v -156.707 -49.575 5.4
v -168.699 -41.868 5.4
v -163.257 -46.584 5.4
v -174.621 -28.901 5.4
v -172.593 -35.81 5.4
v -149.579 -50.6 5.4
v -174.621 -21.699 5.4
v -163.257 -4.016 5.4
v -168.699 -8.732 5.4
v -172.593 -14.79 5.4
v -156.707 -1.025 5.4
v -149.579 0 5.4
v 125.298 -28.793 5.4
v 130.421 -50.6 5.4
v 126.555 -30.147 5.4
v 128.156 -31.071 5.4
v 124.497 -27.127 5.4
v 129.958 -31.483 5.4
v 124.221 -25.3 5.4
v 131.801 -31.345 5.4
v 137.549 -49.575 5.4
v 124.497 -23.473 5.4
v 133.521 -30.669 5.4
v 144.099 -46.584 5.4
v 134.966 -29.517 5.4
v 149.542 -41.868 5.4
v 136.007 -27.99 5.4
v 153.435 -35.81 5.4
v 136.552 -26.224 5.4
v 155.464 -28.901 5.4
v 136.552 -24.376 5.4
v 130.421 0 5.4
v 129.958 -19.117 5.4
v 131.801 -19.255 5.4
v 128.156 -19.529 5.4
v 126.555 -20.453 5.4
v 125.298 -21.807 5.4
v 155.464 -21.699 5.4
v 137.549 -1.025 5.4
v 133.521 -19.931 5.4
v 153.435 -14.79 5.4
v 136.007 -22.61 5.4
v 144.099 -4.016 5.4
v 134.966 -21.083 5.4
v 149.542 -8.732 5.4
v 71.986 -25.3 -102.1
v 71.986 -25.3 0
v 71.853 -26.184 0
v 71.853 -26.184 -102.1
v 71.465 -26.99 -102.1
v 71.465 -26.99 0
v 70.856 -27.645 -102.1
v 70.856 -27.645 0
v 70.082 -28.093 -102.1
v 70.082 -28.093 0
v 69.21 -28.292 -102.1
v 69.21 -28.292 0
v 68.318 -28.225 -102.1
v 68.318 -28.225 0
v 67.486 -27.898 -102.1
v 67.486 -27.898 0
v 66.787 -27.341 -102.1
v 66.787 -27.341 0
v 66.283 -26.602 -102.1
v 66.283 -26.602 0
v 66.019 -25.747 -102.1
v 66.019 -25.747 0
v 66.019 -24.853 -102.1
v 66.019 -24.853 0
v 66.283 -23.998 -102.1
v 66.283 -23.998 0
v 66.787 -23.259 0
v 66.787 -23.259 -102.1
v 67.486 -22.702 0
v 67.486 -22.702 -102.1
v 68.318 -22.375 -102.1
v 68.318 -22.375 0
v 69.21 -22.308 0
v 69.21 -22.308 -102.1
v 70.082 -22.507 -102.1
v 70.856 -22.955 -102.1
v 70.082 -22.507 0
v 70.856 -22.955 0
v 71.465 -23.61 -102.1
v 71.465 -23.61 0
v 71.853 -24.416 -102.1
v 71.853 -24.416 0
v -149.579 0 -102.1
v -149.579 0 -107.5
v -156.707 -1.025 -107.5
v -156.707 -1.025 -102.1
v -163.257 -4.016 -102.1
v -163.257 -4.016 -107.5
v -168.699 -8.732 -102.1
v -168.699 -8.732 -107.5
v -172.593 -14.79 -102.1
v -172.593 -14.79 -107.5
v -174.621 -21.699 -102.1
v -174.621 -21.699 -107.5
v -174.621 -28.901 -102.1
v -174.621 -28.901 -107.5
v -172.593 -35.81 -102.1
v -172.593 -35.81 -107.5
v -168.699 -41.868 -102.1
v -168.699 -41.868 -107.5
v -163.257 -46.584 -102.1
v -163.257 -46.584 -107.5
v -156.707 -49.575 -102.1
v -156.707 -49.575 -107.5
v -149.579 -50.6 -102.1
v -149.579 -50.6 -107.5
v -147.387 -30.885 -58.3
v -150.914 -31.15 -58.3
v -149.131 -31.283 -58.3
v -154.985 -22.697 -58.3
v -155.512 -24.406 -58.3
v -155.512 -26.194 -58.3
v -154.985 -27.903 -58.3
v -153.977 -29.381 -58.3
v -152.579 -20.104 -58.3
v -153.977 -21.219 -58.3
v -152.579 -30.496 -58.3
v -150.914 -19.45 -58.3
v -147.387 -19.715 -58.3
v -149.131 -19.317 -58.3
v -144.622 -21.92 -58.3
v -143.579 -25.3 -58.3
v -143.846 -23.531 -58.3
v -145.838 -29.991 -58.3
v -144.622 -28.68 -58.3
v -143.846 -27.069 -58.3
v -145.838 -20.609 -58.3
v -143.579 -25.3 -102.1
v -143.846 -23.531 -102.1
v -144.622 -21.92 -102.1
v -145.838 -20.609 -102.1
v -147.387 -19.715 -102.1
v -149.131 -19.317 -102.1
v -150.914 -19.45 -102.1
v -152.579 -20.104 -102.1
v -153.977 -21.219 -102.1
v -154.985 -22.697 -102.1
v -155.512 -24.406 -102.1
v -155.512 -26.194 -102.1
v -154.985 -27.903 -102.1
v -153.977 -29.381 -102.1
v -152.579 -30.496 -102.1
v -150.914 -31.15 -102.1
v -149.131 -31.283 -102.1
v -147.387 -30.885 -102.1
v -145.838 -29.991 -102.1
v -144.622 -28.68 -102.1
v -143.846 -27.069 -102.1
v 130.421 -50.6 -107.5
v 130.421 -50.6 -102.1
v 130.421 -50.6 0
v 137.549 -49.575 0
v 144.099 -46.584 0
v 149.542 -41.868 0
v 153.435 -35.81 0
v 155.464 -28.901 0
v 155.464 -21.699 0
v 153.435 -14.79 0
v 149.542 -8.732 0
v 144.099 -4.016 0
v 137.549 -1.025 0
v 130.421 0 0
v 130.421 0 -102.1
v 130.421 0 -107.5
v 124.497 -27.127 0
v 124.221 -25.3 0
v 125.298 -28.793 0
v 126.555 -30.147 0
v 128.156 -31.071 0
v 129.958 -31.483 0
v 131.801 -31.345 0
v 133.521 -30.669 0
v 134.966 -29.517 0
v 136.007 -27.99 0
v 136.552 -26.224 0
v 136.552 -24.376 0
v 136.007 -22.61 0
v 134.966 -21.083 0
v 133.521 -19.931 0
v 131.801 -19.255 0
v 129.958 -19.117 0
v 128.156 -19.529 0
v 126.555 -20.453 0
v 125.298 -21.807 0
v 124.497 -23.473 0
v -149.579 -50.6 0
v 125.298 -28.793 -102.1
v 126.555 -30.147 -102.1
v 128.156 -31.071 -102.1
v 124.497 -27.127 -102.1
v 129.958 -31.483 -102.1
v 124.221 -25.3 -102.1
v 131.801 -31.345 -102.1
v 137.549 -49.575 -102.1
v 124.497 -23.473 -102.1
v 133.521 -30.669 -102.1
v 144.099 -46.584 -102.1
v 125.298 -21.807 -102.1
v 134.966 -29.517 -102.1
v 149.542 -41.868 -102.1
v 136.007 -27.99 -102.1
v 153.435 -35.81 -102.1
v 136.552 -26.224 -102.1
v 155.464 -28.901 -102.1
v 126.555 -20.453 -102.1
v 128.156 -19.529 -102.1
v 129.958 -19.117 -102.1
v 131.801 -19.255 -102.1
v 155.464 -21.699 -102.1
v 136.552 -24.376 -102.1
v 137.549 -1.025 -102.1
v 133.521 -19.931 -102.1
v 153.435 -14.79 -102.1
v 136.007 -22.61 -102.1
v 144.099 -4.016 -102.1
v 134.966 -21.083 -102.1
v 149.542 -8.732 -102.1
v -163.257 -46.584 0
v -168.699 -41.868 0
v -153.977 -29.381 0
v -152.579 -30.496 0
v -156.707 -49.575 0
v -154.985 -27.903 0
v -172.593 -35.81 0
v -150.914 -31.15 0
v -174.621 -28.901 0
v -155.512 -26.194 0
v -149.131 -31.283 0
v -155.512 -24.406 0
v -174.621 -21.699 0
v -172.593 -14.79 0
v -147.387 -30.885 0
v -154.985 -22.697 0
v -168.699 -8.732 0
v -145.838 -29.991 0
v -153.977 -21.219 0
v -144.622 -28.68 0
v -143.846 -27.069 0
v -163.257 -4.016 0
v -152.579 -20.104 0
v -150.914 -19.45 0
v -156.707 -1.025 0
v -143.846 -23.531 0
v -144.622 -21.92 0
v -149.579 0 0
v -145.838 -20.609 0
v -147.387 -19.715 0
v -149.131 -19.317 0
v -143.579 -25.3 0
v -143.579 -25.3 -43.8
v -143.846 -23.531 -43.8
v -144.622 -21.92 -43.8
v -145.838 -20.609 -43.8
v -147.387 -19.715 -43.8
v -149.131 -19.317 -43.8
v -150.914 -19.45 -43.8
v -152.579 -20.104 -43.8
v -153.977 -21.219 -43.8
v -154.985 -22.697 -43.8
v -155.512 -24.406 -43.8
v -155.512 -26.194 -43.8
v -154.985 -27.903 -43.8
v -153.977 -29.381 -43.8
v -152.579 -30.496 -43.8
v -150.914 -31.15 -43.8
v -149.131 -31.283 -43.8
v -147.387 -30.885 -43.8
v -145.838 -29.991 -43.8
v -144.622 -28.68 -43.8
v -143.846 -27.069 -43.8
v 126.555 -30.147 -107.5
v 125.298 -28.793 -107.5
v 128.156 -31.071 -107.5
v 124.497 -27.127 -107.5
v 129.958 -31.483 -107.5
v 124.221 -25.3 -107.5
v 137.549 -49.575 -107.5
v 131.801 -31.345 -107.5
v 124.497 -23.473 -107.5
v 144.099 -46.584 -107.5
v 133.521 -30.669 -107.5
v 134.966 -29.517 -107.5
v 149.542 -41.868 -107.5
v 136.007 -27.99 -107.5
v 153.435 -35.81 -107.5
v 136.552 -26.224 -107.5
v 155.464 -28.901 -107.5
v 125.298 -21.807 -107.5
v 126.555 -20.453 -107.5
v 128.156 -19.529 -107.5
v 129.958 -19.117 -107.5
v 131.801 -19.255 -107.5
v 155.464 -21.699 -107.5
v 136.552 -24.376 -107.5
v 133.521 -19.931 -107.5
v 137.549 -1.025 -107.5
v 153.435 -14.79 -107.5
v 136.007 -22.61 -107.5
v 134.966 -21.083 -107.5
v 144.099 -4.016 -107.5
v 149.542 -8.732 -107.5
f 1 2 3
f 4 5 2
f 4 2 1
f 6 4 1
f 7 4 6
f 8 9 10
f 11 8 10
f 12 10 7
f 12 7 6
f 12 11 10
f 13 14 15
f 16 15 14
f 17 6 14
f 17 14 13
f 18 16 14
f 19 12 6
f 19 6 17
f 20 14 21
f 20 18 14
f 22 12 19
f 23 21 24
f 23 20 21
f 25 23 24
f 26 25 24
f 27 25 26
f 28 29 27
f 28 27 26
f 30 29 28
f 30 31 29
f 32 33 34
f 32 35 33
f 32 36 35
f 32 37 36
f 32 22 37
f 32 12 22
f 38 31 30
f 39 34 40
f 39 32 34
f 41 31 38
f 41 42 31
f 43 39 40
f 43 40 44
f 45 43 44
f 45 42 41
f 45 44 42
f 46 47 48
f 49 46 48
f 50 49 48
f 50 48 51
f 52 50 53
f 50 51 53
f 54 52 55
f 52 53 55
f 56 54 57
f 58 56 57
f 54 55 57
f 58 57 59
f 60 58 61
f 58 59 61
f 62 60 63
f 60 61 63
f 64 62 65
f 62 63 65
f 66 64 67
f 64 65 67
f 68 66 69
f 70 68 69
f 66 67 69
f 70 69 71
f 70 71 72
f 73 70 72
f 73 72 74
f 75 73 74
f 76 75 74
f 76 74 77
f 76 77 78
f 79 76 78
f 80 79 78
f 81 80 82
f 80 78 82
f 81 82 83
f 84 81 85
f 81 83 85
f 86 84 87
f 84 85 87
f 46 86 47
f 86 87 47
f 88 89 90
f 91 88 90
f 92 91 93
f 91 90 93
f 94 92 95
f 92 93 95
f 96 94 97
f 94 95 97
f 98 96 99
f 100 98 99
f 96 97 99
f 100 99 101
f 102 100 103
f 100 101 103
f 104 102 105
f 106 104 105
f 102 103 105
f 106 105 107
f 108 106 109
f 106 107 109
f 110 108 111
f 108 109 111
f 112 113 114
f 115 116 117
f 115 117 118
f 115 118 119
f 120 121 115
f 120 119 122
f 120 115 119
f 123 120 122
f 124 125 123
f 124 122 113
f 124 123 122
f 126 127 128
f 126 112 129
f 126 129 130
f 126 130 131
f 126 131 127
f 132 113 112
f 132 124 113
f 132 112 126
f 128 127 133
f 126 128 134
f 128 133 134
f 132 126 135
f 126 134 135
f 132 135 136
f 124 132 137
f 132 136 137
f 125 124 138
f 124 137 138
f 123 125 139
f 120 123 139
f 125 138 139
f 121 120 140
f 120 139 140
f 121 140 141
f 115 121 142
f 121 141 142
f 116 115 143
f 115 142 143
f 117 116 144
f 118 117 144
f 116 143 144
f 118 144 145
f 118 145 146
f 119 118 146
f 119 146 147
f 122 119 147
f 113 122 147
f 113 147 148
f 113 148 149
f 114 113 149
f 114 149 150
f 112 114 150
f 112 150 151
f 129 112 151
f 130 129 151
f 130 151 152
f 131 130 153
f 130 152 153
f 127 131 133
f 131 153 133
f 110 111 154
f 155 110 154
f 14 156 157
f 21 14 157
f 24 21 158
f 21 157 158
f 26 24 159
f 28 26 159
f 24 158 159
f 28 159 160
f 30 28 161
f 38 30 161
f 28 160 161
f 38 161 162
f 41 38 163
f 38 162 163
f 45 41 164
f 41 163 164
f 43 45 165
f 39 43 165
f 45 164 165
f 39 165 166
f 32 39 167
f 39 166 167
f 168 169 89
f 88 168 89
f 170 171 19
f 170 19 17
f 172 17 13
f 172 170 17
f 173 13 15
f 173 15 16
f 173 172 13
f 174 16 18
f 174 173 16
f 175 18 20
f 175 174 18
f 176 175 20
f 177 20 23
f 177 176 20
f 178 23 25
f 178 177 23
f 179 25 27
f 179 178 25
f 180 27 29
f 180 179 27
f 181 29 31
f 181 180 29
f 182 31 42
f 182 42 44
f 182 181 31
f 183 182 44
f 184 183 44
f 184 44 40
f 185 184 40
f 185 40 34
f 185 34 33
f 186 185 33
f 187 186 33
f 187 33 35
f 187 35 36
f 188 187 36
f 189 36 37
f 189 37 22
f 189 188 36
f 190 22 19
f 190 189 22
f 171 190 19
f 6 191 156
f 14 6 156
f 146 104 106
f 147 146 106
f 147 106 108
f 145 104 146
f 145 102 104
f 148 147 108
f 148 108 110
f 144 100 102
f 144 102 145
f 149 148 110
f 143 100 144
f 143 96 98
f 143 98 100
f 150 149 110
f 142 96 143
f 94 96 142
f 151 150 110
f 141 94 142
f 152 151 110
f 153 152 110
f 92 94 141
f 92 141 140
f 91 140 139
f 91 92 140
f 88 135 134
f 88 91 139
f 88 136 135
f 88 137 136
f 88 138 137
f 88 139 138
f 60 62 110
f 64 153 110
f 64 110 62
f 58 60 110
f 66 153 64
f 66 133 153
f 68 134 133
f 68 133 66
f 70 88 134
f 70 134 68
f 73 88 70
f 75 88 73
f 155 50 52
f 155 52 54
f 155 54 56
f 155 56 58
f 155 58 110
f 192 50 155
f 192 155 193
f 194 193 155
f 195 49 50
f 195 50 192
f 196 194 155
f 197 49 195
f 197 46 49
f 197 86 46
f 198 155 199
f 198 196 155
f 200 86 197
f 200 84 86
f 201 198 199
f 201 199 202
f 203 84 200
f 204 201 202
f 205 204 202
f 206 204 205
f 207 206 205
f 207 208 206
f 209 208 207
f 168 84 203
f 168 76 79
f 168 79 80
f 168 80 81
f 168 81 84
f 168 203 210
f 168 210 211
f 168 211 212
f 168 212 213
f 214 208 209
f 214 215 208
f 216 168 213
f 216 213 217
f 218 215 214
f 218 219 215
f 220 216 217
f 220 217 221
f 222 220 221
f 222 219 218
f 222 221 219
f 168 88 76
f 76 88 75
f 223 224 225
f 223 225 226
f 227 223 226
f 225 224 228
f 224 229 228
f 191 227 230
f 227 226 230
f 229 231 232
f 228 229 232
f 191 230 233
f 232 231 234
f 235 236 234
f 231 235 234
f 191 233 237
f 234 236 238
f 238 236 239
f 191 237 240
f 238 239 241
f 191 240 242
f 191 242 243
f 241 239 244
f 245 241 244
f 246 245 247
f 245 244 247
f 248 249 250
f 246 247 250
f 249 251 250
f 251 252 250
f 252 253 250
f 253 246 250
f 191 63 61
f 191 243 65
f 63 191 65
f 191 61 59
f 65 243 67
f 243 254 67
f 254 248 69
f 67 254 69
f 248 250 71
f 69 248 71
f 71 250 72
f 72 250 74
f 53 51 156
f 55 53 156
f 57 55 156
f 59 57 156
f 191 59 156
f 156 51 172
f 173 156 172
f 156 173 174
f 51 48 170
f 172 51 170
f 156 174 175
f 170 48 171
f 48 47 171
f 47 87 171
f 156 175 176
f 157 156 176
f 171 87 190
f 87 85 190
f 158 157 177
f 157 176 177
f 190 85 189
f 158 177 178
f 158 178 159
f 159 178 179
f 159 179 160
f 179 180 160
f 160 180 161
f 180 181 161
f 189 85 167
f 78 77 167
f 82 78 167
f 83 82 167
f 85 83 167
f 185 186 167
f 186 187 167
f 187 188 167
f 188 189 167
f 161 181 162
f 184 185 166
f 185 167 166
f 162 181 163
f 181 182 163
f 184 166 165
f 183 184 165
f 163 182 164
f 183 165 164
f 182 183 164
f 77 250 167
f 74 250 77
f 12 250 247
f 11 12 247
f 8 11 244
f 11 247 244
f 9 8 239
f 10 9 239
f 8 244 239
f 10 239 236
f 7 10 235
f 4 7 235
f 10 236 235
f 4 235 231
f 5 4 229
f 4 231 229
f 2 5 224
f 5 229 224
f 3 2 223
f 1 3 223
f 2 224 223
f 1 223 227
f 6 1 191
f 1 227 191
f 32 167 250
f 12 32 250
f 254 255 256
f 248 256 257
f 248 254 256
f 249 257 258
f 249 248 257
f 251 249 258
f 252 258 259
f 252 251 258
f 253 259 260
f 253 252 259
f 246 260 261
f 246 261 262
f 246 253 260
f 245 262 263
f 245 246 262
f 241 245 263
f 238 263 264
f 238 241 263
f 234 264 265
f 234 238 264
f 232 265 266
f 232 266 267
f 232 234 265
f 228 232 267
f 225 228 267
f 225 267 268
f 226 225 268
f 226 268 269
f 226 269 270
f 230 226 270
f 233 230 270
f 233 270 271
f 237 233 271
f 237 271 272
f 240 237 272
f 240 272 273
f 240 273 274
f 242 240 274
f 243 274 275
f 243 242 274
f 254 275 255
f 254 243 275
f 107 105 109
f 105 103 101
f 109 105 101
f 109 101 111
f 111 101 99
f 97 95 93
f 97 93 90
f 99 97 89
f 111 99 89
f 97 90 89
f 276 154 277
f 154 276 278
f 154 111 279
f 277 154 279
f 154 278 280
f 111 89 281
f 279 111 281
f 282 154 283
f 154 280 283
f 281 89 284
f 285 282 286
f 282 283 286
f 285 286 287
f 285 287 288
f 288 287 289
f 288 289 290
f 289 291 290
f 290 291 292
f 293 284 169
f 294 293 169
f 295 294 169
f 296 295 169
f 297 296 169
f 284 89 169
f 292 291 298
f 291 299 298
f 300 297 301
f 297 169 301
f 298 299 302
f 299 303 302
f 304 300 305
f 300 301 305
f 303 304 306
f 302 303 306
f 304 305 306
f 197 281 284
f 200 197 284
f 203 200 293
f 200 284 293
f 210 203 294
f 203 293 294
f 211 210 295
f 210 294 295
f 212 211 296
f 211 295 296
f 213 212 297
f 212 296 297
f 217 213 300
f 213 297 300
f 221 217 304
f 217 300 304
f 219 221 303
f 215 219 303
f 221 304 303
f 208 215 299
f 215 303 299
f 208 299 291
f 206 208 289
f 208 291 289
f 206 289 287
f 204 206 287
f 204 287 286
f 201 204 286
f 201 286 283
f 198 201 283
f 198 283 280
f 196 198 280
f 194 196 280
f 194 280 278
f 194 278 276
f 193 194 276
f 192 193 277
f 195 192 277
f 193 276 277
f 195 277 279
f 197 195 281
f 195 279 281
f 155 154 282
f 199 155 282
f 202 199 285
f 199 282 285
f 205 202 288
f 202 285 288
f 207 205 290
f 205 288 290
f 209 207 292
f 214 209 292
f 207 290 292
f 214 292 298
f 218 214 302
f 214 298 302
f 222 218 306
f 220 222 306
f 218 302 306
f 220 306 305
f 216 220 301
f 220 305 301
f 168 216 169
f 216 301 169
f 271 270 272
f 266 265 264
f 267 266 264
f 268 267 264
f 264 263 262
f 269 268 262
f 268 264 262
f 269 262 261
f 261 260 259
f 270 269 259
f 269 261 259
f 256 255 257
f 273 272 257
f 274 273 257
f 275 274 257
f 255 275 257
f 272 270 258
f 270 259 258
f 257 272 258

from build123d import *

# Parameters (mm, degrees)
SKETCH1_R           = 6.2
BOSS_EXTRUDE1_DEPTH = 5.4
SKETCH2_R           = 3
BOSS_EXTRUDE3_DEPTH = 102.1
BOSS_EXTRUDE4_START = 5.4
SKETCH4_R           = 6.2
BOSS_EXTRUDE4_DEPTH = 5.4
SKETCH5_R           = 6
BOSS_EXTRUDE5_DEPTH = 43.8


with BuildPart() as part:
    # Sketch1 → Boss-Extrude1 (new body)
    with BuildSketch(Plane.XY):
        with BuildLine():
            Line((0, 0), (-149.578947368, 0))
            ThreePointArc((-149.578947368, 0), (-174.878947368, -25.3), (-149.578947368, -50.6))
            Line((-149.578947368, -50.6), (130.421052632, -50.6))
            ThreePointArc((130.421052632, -50.6), (155.721052632, -25.3), (130.421052632, 0))
            Line((130.421052632, 0), (0, 0))
        make_face()
        with Locations(Location((130.421052632, -25.3, 0), (0, 0, 180))):
            Circle(SKETCH1_R, mode=Mode.SUBTRACT)
    extrude(amount=BOSS_EXTRUDE1_DEPTH)

    # Sketch2 → Boss-Extrude3 (add)
    with BuildSketch(Plane(origin=(0, 0, 0), x_dir=(-1, 0, 0), z_dir=(0, 0, -1))):
        with Locations(Location((-68.985809966, -25.3, 0), (0, 0, 180))):
            Circle(SKETCH2_R)
    extrude(amount=BOSS_EXTRUDE3_DEPTH)

    # Sketch4 → Boss-Extrude4 (add)
    with BuildSketch(Plane(origin=(0, 0, -102.1), x_dir=(-1, 0, 0), z_dir=(0, 0, -1)).offset(BOSS_EXTRUDE4_START)):
        with BuildLine():
            Line((-130.421052632, 0), (149.578947368, 0))
            ThreePointArc((149.578947368, 0), (174.878947368, -25.3), (149.578947368, -50.6))
            Line((149.578947368, -50.6), (-130.421052632, -50.6))
            ThreePointArc((-130.421052632, -50.6), (-155.721052632, -25.3), (-130.421052632, 0))
        make_face()
        with Locations((-130.421052632, -25.3)):
            Circle(SKETCH4_R, mode=Mode.SUBTRACT)
    extrude(amount=-BOSS_EXTRUDE4_DEPTH)

    # Sketch5 → Boss-Extrude5 (add)
    with BuildSketch(Plane.XY.offset(-102.1)):
        with Locations((-149.578947368, -25.3)):
            Circle(SKETCH5_R)
    boss_extrude5 = extrude(amount=BOSS_EXTRUDE5_DEPTH)

    # Mirror1: Boss-Extrude5 across plane
    add(boss_extrude5.mirror(Plane.XY.offset(-51.05)))


solid = part.part
